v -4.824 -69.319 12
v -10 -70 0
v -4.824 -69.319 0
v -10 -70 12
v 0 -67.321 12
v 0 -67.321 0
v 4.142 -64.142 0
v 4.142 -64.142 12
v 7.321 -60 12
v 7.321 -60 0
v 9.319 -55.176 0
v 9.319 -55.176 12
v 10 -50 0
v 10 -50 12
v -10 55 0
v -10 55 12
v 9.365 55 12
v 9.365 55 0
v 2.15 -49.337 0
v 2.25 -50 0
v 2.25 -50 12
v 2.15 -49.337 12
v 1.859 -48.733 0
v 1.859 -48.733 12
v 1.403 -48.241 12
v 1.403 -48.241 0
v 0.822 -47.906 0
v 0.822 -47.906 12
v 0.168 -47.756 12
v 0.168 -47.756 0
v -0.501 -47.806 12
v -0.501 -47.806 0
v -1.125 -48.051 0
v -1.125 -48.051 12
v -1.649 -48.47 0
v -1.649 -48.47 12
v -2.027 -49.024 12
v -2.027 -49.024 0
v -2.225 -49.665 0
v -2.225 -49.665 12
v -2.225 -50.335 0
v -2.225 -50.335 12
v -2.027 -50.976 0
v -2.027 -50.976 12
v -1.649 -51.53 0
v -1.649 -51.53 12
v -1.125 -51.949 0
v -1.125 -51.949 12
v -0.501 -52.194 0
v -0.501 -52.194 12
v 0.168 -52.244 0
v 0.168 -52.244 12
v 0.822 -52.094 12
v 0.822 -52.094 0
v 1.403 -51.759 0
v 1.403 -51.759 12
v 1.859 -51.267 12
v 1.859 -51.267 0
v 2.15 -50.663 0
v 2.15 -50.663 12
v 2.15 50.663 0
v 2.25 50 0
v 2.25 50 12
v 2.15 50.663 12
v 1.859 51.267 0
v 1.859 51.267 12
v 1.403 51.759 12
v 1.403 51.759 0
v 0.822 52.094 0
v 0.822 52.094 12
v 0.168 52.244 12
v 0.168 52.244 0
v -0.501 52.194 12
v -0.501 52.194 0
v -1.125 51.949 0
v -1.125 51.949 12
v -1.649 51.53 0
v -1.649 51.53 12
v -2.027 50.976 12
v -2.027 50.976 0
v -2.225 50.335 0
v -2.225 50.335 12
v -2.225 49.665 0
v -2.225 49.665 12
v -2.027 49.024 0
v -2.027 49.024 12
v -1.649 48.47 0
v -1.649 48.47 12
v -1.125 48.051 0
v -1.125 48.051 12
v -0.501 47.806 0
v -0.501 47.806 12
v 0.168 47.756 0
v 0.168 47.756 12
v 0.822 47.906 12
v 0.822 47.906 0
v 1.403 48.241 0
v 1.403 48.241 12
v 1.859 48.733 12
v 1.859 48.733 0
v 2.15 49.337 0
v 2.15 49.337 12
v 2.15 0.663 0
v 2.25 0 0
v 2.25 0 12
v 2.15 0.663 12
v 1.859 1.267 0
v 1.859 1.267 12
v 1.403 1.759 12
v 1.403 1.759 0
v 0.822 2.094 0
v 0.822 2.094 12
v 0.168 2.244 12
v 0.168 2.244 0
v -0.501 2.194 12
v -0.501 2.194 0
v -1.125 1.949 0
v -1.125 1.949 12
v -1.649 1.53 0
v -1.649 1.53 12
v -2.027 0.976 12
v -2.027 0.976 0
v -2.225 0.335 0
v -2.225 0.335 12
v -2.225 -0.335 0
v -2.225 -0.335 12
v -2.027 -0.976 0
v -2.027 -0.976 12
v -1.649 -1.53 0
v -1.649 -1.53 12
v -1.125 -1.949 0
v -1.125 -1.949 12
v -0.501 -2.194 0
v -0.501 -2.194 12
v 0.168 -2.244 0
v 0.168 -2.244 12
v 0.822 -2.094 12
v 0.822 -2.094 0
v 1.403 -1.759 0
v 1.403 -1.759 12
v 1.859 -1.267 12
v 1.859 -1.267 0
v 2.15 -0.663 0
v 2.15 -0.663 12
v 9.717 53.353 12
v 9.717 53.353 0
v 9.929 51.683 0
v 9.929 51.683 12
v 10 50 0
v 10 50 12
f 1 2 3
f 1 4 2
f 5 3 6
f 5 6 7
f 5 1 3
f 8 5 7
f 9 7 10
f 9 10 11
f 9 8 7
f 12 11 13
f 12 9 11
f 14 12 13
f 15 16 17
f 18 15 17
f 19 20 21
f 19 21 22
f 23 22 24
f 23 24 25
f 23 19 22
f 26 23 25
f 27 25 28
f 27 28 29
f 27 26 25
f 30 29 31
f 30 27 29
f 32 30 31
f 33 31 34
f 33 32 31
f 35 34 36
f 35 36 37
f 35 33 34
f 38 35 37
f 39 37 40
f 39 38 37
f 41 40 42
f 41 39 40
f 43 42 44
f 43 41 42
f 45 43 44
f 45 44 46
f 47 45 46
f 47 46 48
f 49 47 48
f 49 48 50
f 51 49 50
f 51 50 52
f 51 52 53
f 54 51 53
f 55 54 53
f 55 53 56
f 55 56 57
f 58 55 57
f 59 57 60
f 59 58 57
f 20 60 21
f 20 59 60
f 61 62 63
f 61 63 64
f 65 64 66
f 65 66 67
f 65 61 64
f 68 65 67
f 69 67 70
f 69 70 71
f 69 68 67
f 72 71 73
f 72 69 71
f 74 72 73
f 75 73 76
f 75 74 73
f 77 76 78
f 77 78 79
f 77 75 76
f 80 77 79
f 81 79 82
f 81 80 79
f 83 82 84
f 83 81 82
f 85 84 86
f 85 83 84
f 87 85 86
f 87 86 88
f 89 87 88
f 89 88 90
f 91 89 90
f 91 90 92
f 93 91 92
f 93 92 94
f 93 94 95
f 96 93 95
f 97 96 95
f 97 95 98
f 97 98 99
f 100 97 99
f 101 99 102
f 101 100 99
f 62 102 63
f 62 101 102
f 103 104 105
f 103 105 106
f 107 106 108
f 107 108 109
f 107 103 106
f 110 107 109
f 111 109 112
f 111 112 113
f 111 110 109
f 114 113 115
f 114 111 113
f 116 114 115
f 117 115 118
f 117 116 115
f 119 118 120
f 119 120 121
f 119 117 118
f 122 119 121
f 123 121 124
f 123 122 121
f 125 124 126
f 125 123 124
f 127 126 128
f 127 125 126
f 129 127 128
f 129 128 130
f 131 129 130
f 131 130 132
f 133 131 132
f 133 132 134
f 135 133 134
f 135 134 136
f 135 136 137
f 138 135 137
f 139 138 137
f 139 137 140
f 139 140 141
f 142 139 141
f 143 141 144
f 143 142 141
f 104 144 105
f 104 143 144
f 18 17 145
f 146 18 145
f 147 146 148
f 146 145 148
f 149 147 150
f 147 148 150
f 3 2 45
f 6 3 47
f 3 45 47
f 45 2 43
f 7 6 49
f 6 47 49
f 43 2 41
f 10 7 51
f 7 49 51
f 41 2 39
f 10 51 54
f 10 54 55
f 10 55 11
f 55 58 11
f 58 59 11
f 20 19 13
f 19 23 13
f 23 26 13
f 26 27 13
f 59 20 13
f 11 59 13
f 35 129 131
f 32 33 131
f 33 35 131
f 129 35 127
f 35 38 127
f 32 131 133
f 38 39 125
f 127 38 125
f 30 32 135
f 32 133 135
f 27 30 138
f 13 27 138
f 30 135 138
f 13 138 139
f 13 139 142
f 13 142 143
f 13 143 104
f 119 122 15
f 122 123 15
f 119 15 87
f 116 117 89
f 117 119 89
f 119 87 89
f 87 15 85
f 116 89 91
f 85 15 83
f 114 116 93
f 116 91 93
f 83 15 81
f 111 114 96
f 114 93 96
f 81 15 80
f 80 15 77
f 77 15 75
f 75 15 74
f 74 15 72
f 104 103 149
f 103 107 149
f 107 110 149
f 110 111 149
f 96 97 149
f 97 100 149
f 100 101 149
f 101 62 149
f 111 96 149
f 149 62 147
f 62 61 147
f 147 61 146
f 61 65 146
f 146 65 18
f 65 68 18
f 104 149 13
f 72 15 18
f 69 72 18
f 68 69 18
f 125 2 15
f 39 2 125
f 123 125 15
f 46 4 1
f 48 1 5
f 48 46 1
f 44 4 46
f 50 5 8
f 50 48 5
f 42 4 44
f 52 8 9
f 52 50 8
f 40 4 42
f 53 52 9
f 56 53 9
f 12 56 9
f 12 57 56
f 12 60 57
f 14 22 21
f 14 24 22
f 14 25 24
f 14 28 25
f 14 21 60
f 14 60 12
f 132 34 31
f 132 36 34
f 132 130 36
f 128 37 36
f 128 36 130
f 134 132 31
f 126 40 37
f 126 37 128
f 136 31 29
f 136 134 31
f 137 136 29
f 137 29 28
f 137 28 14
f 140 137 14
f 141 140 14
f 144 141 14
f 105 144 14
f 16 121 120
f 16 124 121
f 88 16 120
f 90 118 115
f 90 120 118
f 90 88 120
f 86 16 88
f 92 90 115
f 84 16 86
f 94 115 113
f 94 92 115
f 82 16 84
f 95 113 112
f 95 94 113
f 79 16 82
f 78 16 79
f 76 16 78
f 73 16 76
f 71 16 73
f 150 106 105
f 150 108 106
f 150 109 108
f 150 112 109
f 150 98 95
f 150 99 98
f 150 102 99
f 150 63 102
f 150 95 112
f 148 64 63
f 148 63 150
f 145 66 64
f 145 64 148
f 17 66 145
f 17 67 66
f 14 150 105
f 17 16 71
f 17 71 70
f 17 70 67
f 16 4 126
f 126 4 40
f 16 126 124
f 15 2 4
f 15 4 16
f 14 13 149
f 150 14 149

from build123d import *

# Parameters (mm, degrees)
SKETCH_1_W          = 20
SKETCH_1_H          = 140
SKETCH_1_R          = 2.25
EXTRUDE_1_DEPTH     = 12
FILLET_1_R          = 20
SKETCH_2_W          = 19.364916731
SKETCH_2_H          = 15
CUT_EXTRUDE_1_DEPTH = 72.721684308


with BuildPart() as part:
    # 草图1 → 凸台-拉伸1 (new body)
    with BuildSketch(Plane.XY):
        Rectangle(SKETCH_1_W, SKETCH_1_H)
        with Locations((0, -50)):
            Circle(SKETCH_1_R, mode=Mode.SUBTRACT)
        Circle(SKETCH_1_R, mode=Mode.SUBTRACT)
        with Locations((0, 50)):
            Circle(SKETCH_1_R, mode=Mode.SUBTRACT)
    extrude(amount=EXTRUDE_1_DEPTH)

    # 圆角1
    fillet_1_edges = [part.edges().sort_by_distance(p)[0] for p in [
        (10, -70, 6),
        (10, 70, 6),
    ]]
    fillet(fillet_1_edges, radius=FILLET_1_R - 0.0001)  # a hair under: the kernel refuses the full size

    # 草图2 → 切除-拉伸1 (cut, through all)
    with BuildSketch(Plane.XY.offset(12)):
        with Locations((-0.317541634, 62.5)):
            Rectangle(SKETCH_2_W, SKETCH_2_H)
    extrude(amount=-CUT_EXTRUDE_1_DEPTH, mode=Mode.SUBTRACT)


solid = part.part
